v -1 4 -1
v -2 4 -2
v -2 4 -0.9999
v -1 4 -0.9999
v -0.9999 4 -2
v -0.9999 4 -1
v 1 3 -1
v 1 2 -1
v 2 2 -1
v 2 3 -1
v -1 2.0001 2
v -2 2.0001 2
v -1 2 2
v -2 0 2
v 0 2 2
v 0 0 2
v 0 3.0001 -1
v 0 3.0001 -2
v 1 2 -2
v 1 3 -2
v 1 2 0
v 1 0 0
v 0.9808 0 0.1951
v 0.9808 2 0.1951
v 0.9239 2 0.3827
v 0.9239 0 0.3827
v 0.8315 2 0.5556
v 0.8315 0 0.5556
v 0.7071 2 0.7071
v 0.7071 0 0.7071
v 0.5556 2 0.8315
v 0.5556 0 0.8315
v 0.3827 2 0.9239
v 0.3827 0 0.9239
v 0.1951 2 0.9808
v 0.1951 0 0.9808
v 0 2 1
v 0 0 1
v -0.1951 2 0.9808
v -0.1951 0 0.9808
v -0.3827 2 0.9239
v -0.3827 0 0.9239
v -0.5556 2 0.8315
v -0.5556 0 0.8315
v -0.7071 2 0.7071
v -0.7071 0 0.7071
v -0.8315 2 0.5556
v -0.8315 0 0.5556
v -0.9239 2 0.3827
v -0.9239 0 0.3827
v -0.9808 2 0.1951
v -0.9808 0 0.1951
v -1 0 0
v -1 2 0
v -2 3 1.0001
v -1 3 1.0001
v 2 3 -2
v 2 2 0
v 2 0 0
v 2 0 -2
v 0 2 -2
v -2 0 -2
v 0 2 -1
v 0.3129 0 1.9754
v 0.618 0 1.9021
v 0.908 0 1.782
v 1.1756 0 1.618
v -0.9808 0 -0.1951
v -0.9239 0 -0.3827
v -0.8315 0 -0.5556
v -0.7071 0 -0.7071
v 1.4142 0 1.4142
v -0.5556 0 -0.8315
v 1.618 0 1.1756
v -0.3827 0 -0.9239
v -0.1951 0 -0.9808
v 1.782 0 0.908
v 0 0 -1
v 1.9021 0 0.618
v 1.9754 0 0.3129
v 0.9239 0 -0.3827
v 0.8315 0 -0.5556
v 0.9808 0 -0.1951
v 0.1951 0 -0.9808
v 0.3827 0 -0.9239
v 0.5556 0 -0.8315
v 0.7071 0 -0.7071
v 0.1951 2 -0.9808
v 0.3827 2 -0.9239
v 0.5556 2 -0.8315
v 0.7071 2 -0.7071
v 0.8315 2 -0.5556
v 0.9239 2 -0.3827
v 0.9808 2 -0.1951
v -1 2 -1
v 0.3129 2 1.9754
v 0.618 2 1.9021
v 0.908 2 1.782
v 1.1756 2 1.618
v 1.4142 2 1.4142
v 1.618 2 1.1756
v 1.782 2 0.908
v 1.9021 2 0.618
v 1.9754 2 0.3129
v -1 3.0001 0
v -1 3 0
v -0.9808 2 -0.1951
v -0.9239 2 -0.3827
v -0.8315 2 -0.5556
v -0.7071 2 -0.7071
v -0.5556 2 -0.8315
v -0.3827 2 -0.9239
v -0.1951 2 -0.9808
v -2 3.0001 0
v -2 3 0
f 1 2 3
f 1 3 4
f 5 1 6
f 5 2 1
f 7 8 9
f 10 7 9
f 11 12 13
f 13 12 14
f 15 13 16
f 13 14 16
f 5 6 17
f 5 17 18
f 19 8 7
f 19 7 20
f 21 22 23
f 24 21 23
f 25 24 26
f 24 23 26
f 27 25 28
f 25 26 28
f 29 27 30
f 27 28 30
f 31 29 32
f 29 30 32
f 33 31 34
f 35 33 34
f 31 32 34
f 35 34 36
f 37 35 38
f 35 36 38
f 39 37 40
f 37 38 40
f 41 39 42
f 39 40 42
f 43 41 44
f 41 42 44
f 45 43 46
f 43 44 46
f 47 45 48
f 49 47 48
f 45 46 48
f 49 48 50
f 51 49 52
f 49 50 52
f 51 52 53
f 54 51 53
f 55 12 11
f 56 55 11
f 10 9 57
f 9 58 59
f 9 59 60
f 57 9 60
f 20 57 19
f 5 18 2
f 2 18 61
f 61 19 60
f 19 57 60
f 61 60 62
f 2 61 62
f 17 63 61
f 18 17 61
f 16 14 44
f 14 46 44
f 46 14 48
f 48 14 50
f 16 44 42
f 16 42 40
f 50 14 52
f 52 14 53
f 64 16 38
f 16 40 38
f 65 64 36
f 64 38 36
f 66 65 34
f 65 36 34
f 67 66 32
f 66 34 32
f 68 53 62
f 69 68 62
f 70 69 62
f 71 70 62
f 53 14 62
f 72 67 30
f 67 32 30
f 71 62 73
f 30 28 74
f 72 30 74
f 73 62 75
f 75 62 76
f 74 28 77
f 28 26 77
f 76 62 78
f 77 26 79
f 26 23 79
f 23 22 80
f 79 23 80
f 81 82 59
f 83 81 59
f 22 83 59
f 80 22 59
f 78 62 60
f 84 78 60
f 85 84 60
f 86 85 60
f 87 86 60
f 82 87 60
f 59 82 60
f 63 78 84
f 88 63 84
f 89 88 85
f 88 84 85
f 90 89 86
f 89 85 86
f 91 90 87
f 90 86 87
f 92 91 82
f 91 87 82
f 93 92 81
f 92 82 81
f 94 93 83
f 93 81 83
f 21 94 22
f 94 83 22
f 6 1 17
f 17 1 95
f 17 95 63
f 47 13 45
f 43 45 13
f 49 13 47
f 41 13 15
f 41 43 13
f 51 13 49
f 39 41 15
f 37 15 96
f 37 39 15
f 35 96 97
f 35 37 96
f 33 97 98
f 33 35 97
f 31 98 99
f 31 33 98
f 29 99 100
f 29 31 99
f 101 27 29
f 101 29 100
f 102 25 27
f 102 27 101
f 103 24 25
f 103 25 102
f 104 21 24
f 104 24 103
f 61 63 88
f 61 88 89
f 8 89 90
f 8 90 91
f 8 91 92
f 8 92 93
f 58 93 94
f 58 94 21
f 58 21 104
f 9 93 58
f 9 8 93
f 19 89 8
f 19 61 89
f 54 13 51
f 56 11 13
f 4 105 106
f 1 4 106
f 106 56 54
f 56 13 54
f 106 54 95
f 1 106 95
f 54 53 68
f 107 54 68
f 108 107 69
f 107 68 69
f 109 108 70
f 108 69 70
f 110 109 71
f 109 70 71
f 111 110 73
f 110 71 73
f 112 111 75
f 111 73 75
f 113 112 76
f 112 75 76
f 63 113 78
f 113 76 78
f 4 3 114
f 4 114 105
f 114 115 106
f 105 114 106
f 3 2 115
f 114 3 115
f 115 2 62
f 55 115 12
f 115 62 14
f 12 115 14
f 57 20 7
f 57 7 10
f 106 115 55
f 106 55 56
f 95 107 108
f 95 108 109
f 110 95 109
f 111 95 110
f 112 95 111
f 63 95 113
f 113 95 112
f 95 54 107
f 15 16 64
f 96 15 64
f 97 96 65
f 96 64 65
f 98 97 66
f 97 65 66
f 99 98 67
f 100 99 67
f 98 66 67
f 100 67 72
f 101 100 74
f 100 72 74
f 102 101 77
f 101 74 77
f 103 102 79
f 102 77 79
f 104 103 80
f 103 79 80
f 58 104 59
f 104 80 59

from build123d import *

# Parameters (mm, degrees)
EXTRUDE_1_DEPTH   = 2
EXTRUDE_1_2_DEPTH = 2
SKETCH_1_3_W      = 1
SKETCH_1_3_H      = 1
EXTRUDE_2_DEPTH   = 3
SKETCH_1_4_W      = 1
SKETCH_1_4_H      = 1
EXTRUDE_3_DEPTH   = 4
CHAMFER_1_SIZE    = 1


with BuildPart() as part:
    # 草圖1 → 填料-伸長1 (new body)
    with BuildSketch(Plane(origin=(0, 0, 0), x_dir=(1, 0, 0), z_dir=(0, 1, 0))):
        with BuildLine():
            Line((0, 2), (0, 1))
            ThreePointArc((0, 1), (0.707106781, 0.707106781), (1, 0))
            ThreePointArc((1, 0), (0, -1), (-1, 0))
            Line((-1, 0), (-1, -1))
            Line((-1, -1), (-1, -2))
            Line((-1, -2), (0, -2))
            ThreePointArc((0, -2), (1.414213562, -1.414213562), (2, 0))
            Line((2, 0), (2, 1))
            Line((2, 1), (1, 1))
            Line((1, 1), (1, 2))
            Line((1, 2), (0, 2))
        make_face()
    extrude(amount=EXTRUDE_1_DEPTH)

    # 草圖1<3> → 填料-伸長2 (add)
    with BuildSketch(Plane(origin=(0, 0, 0), x_dir=(1, 0, 0), z_dir=(0, 1, 0))):
        with Locations((1.5, 1.5)):
            Rectangle(SKETCH_1_3_W, SKETCH_1_3_H)
        with Locations((-1.5, -1.5)):
            Rectangle(SKETCH_1_3_W, SKETCH_1_3_H)
        with Locations((-1.5, -0.5)):
            Rectangle(SKETCH_1_3_W, SKETCH_1_3_H)
    extrude(amount=EXTRUDE_2_DEPTH)



with BuildPart() as body_2:
    # 草圖1 → Extrude 1 2 (new body)
    with BuildSketch(Plane(origin=(0, 0, 0), x_dir=(1, 0, 0), z_dir=(0, 1, 0))):
        with BuildLine():
            Line((0, 1), (-1, 1))
            Line((-1, 1), (-1, 0))
            ThreePointArc((-1, 0), (-0.707106781, 0.707106781), (0, 1))
        make_face()
    extrude(amount=EXTRUDE_1_2_DEPTH)


with BuildPart() as part_1:
    add(part.part)

    add(body_2.part)  # 填料-伸長3 merges body 2
    # 草圖1<4> → 填料-伸長3 (add)
    with BuildSketch(Plane(origin=(0, 0, 0), x_dir=(1, 0, 0), z_dir=(0, 1, 0))):
        with Locations((-0.5, 1.5)):
            Rectangle(SKETCH_1_4_W, SKETCH_1_4_H)
        with Locations((-1.5, 1.5)):
            Rectangle(SKETCH_1_4_W, SKETCH_1_4_H)
        with Locations((-1.5, 0.5)):
            Rectangle(SKETCH_1_4_W, SKETCH_1_4_H)
    extrude(amount=EXTRUDE_3_DEPTH)

    # 導角1
    chamfer_1_edges = [part_1.edges().sort_by_distance(p)[0] for p in [
        (0, 4, -1.5),
        (-1.5, 4, 0),
        (-1.5, 3, 2),
    ]]
    chamfer(chamfer_1_edges, length=CHAMFER_1_SIZE - 0.0001)  # a hair under: the kernel refuses the full size


solid = part_1.part
